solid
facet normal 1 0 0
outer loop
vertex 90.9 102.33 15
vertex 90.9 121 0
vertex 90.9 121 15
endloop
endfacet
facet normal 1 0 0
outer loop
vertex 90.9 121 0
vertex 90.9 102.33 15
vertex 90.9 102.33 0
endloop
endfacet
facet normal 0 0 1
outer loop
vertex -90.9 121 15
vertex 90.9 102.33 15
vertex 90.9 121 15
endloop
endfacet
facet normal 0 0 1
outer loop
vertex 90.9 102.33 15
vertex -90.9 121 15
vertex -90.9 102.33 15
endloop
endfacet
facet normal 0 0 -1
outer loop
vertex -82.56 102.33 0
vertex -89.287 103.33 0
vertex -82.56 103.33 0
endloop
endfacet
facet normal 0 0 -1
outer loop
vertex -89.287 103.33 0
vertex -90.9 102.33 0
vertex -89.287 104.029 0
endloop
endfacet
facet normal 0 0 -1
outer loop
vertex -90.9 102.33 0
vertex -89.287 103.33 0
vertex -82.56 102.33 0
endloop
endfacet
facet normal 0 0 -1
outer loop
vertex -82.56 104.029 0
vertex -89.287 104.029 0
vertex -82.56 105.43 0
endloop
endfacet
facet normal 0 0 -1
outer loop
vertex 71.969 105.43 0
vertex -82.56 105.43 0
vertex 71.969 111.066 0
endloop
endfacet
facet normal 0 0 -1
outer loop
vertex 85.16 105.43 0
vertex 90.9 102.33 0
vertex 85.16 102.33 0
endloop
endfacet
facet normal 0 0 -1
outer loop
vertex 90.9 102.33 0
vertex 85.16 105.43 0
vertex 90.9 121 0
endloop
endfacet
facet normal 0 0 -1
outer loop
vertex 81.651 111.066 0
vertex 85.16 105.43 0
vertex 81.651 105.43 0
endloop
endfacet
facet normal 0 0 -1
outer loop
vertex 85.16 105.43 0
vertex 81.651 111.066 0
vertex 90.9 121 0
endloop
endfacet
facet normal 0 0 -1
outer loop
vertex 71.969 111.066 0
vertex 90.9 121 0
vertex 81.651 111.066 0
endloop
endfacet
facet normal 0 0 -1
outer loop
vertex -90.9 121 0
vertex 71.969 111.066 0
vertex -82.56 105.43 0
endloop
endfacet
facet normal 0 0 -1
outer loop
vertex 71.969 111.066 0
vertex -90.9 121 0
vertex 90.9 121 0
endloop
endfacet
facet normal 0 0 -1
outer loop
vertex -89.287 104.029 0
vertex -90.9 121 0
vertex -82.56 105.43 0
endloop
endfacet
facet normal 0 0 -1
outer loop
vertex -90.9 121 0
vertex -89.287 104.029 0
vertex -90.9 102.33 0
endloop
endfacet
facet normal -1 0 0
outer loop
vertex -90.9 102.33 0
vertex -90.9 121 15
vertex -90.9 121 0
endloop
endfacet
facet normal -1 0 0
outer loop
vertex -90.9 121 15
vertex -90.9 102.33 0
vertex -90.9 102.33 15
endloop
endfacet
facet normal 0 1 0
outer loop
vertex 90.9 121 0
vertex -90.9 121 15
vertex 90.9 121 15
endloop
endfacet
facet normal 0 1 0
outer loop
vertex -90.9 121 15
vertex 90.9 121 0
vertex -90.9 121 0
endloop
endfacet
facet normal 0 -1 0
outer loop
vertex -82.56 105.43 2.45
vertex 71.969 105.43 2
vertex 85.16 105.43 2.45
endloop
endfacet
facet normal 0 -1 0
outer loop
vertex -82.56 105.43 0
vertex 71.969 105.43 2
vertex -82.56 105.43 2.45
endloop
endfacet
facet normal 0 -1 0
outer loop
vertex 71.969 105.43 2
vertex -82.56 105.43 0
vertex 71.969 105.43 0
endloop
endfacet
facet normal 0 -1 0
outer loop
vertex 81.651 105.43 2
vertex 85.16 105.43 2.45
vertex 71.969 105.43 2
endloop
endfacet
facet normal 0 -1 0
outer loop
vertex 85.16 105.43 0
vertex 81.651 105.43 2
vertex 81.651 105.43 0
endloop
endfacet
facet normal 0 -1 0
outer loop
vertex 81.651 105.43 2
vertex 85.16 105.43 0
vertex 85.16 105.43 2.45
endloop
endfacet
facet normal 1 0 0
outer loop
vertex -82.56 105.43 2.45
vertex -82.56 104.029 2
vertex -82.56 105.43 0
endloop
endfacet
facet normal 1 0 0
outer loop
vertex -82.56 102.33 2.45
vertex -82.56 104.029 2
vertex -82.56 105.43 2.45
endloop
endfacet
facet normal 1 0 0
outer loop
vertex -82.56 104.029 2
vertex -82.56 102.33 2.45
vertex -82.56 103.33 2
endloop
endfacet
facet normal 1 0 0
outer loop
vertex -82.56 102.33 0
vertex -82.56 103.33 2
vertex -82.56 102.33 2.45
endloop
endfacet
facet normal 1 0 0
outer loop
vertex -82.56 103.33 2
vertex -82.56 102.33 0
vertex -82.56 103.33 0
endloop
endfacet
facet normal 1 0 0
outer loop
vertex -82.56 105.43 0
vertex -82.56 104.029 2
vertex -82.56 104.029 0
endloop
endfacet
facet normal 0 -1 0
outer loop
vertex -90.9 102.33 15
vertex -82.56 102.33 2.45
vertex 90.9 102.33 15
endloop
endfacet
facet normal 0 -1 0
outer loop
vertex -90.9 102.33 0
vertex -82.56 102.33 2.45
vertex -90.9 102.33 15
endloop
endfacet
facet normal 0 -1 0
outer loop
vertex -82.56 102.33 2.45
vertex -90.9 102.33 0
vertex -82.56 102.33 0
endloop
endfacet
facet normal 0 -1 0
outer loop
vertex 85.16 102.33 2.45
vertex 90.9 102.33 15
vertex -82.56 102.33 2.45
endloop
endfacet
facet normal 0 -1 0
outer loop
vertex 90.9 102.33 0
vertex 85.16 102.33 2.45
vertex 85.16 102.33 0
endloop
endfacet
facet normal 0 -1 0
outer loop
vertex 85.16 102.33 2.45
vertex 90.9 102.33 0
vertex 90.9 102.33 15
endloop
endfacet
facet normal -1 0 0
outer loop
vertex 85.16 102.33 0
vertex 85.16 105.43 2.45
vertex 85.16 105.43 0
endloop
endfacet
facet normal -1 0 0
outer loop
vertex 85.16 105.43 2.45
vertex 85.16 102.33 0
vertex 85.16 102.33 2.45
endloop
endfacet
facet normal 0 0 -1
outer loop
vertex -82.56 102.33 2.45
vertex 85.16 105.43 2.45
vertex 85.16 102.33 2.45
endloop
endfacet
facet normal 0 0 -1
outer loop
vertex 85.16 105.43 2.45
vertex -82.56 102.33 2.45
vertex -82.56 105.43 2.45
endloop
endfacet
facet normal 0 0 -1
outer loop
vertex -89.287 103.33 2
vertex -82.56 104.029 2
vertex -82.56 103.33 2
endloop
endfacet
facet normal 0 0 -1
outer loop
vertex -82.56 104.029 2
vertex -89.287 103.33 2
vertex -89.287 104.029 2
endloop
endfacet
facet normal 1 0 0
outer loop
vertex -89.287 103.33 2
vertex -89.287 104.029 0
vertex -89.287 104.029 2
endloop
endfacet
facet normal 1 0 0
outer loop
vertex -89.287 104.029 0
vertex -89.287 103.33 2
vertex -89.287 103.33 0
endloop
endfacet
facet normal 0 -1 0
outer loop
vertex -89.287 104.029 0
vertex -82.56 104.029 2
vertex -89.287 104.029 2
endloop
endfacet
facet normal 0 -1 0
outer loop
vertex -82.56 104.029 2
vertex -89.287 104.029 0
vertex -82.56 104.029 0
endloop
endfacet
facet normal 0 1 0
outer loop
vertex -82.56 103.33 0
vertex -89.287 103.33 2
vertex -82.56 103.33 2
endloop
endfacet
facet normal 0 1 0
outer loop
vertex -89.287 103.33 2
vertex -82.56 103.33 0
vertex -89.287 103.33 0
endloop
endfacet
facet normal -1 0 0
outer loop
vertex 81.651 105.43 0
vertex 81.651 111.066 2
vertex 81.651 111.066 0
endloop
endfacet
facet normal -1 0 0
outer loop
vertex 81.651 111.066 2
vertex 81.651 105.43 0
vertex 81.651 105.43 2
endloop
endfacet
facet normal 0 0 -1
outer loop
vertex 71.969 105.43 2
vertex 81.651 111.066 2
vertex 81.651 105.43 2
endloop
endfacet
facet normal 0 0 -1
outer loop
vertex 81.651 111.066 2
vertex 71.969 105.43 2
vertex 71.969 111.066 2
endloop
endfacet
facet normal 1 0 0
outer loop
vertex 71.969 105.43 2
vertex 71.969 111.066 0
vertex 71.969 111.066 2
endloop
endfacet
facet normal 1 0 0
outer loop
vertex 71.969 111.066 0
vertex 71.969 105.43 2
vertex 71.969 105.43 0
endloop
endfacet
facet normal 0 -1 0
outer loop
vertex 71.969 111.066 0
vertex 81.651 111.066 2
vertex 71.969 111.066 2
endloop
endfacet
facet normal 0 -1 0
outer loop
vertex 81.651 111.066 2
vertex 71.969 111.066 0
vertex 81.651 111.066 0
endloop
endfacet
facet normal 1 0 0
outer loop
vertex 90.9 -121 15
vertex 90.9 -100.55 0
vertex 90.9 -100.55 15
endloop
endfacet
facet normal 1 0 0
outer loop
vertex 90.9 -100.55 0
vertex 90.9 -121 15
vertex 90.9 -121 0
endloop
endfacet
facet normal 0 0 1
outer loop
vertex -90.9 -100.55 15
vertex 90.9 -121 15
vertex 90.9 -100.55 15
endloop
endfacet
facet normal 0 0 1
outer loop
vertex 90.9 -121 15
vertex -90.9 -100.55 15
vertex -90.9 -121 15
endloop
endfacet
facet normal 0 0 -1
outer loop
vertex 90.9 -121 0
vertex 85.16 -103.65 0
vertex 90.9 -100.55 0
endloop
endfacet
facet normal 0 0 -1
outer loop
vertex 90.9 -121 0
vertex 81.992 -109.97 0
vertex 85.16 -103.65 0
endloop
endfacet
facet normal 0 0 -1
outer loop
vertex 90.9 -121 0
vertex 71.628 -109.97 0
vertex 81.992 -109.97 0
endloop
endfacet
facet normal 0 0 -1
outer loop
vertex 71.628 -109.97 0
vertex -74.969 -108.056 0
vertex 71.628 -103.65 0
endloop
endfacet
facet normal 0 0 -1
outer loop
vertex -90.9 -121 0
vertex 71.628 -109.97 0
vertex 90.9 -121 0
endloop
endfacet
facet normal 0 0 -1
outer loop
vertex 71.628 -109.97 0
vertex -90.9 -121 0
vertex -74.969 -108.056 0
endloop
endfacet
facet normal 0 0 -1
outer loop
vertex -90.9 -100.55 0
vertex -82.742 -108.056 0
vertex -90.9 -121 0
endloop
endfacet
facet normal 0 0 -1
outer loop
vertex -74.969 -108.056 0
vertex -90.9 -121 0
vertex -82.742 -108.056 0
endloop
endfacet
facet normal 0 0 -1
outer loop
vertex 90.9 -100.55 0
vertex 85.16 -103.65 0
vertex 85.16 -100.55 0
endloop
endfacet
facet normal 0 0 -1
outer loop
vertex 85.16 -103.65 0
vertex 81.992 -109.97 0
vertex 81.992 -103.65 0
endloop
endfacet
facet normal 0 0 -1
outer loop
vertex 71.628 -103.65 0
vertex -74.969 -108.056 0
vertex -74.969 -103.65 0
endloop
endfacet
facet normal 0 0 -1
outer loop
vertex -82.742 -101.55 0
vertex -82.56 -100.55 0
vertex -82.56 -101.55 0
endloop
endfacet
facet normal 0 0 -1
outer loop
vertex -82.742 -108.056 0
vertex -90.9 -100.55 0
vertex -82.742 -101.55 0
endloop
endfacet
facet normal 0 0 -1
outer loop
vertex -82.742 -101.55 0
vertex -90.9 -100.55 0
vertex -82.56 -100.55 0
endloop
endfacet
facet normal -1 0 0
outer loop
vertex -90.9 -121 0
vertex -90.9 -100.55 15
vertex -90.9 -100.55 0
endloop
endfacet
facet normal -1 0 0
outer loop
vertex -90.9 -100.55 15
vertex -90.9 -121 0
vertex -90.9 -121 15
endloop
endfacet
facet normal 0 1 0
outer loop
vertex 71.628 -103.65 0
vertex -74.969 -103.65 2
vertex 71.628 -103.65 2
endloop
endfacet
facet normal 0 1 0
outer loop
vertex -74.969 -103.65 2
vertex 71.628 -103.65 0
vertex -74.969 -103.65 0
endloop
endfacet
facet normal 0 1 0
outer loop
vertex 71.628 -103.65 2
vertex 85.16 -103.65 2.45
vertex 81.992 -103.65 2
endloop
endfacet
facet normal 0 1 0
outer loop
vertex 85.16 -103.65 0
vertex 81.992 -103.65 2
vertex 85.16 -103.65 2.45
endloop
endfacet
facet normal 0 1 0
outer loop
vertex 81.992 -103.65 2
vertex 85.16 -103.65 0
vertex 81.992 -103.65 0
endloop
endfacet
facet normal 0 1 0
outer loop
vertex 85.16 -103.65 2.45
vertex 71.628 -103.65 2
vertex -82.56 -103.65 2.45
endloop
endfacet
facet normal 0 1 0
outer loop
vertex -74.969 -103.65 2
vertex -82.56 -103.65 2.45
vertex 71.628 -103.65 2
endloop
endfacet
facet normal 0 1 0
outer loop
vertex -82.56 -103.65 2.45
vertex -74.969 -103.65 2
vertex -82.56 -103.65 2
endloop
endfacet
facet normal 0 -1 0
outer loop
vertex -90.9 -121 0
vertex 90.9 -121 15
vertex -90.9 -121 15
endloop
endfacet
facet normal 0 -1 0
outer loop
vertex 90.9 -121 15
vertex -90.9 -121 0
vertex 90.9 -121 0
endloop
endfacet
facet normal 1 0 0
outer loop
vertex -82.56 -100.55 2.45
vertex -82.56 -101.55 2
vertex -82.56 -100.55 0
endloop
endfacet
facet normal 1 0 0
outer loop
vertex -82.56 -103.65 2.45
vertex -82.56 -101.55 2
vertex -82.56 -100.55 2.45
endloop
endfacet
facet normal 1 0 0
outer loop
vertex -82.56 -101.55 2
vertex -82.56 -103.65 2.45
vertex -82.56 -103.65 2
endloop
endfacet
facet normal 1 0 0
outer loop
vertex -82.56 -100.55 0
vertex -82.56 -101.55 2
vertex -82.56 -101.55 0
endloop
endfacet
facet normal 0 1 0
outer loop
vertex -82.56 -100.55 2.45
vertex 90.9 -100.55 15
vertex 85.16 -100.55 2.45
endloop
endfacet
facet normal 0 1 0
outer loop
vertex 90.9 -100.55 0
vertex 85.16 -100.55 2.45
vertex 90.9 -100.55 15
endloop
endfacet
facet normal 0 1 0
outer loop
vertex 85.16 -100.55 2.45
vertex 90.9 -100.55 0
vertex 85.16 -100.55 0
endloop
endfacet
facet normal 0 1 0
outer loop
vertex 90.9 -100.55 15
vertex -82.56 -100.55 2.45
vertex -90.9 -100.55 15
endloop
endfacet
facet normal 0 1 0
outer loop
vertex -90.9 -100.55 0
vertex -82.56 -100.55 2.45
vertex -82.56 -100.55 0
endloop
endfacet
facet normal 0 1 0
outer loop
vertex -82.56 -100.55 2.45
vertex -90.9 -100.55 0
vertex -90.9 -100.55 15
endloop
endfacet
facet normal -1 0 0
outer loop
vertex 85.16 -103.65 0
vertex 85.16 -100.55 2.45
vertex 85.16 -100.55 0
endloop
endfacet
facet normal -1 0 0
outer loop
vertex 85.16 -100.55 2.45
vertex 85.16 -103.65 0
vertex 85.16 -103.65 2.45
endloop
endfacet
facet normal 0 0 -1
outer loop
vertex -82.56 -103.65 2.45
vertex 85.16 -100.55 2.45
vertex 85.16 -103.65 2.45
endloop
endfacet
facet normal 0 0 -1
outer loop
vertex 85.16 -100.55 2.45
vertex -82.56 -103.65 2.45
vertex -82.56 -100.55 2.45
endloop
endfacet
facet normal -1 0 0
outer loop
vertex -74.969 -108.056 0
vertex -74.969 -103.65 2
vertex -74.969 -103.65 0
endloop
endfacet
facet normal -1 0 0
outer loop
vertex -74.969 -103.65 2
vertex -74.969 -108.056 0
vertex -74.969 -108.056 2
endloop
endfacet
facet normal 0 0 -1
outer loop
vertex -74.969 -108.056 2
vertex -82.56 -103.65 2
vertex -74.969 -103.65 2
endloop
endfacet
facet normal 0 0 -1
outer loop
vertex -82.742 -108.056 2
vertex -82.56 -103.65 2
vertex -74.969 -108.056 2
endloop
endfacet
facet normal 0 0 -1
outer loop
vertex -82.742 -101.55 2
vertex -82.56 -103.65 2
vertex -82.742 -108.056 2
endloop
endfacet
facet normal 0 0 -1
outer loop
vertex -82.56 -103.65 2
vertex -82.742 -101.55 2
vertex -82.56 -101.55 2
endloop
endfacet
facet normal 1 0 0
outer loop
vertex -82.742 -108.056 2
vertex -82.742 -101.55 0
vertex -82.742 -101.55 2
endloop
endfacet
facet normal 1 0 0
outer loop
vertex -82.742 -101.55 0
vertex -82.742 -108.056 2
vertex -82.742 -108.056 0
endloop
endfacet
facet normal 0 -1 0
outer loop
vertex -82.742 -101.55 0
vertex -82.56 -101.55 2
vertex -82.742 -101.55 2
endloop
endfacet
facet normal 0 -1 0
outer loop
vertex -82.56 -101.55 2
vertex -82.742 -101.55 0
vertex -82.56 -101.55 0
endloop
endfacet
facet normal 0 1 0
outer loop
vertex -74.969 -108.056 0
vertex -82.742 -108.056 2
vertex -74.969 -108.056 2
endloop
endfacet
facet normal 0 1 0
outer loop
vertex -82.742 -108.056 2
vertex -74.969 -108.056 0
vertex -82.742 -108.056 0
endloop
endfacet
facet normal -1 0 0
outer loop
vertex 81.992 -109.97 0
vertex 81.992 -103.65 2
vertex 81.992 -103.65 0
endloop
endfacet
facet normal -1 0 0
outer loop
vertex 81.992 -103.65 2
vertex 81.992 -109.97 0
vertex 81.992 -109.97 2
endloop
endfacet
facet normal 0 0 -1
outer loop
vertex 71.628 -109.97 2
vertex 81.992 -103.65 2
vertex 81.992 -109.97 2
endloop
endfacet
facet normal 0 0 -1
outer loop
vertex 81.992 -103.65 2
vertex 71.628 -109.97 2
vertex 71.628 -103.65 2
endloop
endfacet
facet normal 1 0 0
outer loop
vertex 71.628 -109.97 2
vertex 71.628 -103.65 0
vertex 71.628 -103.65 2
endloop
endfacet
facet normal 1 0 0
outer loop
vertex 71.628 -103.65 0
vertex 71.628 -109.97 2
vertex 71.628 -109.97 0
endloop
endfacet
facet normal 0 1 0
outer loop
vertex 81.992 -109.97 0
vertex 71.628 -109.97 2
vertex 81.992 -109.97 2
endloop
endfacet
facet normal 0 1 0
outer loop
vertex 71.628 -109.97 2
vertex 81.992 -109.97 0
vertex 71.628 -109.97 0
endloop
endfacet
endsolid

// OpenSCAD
// Photo-frame brackets for the LP097QX1-SPC1 LCD — parametric OpenSCAD twin of build_brackets.py
// Two L / back-press brackets on the panel's SHORT sides (top + bottom). Friction-fit in the frame.
// No front lip: the screen sits flat on the glass; a rear shelf 'preload' proud of the panel rear is
// pushed by the frame backing -> LCD onto the glass (push from behind). Centers the VIEW (active)
// area. Lug ears are on the LCD FRONT (recessed ~0.25mm) -> ear pockets on the front face, which
// shape-keys the part (only seats ears-toward-glass, keeping the shelf at the back).
// Frame coords: origin = frame center, X right, Y up, Z=0 glass -> +Z into cavity.
//   render: openscad -o bracket_top.stl -D part=\"top\" brackets.scad
//   thin test print: add -D total_z=5
part = "both";        // "both" | "top" | "bottom"

/* ---- frame + panel ---- */
frame_w = 182;        // photo-frame inner width
frame_h = 242;        // photo-frame inner height
panel_w = 167.12;     // LCD outline
panel_h = 208.88;
panel_th = 2.60;      // LCD thickness
act_cx  = -1.30;      // active-area offset on the outline
act_cy  = -0.89;
view_center = true;   // center active area (true) or outline (false)

/* ---- bracket / fit ---- */
total_z = 15.0;       // bracket thickness (glass -> frame backing) = cavity depth
preload = 0.15;       // rear shelf sits this proud of panel rear -> light forward press
lip_y   = 3.0;        // rear-shelf overhang onto the panel border
fit_clr = 0.2;        // friction: length = frame_w - fit_clr
seat_clr = 0.1;       // play, panel edge vs channel web
pocket_clr = 0.3;     // play, panel corner vs X end-stops
ear_clr = 1.5;        // margin around an ear pocket
ear_on_back = false;  // lugs on the LCD FRONT (recessed ~0.25mm) -> clear them on the front face
ear_z   = 2.0;        // front pocket depth from the glass (clears the ~0.25..0.55 front ear tabs)
gap     = 0.001;      // tiny boolean overlap

/* ---- ear spans [xmin,xmax,ymin,ymax] from geometry.json ---- */
ear_TL = [-87.787, -83.560,  94.874, 101.639];
ear_TR = [ 73.469,  80.151, 104.440, 108.676];
ear_BL = [-81.242, -76.469,-107.446,-103.480];
ear_BR = [ 73.128,  80.492,-109.360,-104.440];

shift_x = view_center ? -act_cx : 0;   // +1.30
shift_y = view_center ? -act_cy : 0;   // +0.89
hw = panel_w/2; hh = panel_h/2;
hfw = frame_w/2; hfh = frame_h/2;
lx = (frame_w - fit_clr)/2;
flange_z0 = panel_th - preload;   // rear shelf front face (2.45)

module boxc(x0,x1,y0,y1,z0,z1) translate([x0,y0,z0]) cube([x1-x0,y1-y0,z1-z0]);

module bracket(side) {                 // side = +1 top, -1 bottom
  edgeY     = side*(hh + side*shift_y);
  webInnerY = edgeY + side*seat_clr;
  lipInnerY = edgeY - side*lip_y;
  wallY     = side*hfh;
  stopL = shift_x - hw - pocket_clr;
  stopR = shift_x + hw + pocket_clr;
  wlo = min(webInnerY,wallY); whi = max(webInnerY,wallY);
  llo = min(lipInnerY,webInnerY); lhi = max(lipInnerY,webInnerY);
  ears = side>0 ? [ear_TL,ear_TR] : [ear_BL,ear_BR];
  difference() {
    union() {
      boxc(-lx, lx, wlo, whi, 0, total_z);              // web / gap filler (front on glass)
      boxc(-lx, stopL, llo, lhi, 0, total_z);           // end stop L
      boxc(stopR, lx, llo, lhi, 0, total_z);            // end stop R
      boxc(stopL, stopR, llo, lhi, flange_z0, total_z); // rear shelf (preload press)
    }
    for (e = ears) {                                    // ear-clearance pockets (FRONT/glass face)
      tipY = (side>0 ? e[3] : e[2]) + shift_y;
      a = min(edgeY - side*2.0, tipY + side*ear_clr);
      c = max(edgeY - side*2.0, tipY + side*ear_clr);
      z0 = ear_on_back ? (panel_th-0.6) : -gap;
      z1 = ear_on_back ? total_z+gap : ear_z;
      boxc(e[0]-ear_clr, e[1]+ear_clr, a, c, z0, z1);
    }
  }
}

if (part == "top")    bracket(1);
if (part == "bottom") bracket(-1);
if (part == "both") { bracket(1); bracket(-1); }
